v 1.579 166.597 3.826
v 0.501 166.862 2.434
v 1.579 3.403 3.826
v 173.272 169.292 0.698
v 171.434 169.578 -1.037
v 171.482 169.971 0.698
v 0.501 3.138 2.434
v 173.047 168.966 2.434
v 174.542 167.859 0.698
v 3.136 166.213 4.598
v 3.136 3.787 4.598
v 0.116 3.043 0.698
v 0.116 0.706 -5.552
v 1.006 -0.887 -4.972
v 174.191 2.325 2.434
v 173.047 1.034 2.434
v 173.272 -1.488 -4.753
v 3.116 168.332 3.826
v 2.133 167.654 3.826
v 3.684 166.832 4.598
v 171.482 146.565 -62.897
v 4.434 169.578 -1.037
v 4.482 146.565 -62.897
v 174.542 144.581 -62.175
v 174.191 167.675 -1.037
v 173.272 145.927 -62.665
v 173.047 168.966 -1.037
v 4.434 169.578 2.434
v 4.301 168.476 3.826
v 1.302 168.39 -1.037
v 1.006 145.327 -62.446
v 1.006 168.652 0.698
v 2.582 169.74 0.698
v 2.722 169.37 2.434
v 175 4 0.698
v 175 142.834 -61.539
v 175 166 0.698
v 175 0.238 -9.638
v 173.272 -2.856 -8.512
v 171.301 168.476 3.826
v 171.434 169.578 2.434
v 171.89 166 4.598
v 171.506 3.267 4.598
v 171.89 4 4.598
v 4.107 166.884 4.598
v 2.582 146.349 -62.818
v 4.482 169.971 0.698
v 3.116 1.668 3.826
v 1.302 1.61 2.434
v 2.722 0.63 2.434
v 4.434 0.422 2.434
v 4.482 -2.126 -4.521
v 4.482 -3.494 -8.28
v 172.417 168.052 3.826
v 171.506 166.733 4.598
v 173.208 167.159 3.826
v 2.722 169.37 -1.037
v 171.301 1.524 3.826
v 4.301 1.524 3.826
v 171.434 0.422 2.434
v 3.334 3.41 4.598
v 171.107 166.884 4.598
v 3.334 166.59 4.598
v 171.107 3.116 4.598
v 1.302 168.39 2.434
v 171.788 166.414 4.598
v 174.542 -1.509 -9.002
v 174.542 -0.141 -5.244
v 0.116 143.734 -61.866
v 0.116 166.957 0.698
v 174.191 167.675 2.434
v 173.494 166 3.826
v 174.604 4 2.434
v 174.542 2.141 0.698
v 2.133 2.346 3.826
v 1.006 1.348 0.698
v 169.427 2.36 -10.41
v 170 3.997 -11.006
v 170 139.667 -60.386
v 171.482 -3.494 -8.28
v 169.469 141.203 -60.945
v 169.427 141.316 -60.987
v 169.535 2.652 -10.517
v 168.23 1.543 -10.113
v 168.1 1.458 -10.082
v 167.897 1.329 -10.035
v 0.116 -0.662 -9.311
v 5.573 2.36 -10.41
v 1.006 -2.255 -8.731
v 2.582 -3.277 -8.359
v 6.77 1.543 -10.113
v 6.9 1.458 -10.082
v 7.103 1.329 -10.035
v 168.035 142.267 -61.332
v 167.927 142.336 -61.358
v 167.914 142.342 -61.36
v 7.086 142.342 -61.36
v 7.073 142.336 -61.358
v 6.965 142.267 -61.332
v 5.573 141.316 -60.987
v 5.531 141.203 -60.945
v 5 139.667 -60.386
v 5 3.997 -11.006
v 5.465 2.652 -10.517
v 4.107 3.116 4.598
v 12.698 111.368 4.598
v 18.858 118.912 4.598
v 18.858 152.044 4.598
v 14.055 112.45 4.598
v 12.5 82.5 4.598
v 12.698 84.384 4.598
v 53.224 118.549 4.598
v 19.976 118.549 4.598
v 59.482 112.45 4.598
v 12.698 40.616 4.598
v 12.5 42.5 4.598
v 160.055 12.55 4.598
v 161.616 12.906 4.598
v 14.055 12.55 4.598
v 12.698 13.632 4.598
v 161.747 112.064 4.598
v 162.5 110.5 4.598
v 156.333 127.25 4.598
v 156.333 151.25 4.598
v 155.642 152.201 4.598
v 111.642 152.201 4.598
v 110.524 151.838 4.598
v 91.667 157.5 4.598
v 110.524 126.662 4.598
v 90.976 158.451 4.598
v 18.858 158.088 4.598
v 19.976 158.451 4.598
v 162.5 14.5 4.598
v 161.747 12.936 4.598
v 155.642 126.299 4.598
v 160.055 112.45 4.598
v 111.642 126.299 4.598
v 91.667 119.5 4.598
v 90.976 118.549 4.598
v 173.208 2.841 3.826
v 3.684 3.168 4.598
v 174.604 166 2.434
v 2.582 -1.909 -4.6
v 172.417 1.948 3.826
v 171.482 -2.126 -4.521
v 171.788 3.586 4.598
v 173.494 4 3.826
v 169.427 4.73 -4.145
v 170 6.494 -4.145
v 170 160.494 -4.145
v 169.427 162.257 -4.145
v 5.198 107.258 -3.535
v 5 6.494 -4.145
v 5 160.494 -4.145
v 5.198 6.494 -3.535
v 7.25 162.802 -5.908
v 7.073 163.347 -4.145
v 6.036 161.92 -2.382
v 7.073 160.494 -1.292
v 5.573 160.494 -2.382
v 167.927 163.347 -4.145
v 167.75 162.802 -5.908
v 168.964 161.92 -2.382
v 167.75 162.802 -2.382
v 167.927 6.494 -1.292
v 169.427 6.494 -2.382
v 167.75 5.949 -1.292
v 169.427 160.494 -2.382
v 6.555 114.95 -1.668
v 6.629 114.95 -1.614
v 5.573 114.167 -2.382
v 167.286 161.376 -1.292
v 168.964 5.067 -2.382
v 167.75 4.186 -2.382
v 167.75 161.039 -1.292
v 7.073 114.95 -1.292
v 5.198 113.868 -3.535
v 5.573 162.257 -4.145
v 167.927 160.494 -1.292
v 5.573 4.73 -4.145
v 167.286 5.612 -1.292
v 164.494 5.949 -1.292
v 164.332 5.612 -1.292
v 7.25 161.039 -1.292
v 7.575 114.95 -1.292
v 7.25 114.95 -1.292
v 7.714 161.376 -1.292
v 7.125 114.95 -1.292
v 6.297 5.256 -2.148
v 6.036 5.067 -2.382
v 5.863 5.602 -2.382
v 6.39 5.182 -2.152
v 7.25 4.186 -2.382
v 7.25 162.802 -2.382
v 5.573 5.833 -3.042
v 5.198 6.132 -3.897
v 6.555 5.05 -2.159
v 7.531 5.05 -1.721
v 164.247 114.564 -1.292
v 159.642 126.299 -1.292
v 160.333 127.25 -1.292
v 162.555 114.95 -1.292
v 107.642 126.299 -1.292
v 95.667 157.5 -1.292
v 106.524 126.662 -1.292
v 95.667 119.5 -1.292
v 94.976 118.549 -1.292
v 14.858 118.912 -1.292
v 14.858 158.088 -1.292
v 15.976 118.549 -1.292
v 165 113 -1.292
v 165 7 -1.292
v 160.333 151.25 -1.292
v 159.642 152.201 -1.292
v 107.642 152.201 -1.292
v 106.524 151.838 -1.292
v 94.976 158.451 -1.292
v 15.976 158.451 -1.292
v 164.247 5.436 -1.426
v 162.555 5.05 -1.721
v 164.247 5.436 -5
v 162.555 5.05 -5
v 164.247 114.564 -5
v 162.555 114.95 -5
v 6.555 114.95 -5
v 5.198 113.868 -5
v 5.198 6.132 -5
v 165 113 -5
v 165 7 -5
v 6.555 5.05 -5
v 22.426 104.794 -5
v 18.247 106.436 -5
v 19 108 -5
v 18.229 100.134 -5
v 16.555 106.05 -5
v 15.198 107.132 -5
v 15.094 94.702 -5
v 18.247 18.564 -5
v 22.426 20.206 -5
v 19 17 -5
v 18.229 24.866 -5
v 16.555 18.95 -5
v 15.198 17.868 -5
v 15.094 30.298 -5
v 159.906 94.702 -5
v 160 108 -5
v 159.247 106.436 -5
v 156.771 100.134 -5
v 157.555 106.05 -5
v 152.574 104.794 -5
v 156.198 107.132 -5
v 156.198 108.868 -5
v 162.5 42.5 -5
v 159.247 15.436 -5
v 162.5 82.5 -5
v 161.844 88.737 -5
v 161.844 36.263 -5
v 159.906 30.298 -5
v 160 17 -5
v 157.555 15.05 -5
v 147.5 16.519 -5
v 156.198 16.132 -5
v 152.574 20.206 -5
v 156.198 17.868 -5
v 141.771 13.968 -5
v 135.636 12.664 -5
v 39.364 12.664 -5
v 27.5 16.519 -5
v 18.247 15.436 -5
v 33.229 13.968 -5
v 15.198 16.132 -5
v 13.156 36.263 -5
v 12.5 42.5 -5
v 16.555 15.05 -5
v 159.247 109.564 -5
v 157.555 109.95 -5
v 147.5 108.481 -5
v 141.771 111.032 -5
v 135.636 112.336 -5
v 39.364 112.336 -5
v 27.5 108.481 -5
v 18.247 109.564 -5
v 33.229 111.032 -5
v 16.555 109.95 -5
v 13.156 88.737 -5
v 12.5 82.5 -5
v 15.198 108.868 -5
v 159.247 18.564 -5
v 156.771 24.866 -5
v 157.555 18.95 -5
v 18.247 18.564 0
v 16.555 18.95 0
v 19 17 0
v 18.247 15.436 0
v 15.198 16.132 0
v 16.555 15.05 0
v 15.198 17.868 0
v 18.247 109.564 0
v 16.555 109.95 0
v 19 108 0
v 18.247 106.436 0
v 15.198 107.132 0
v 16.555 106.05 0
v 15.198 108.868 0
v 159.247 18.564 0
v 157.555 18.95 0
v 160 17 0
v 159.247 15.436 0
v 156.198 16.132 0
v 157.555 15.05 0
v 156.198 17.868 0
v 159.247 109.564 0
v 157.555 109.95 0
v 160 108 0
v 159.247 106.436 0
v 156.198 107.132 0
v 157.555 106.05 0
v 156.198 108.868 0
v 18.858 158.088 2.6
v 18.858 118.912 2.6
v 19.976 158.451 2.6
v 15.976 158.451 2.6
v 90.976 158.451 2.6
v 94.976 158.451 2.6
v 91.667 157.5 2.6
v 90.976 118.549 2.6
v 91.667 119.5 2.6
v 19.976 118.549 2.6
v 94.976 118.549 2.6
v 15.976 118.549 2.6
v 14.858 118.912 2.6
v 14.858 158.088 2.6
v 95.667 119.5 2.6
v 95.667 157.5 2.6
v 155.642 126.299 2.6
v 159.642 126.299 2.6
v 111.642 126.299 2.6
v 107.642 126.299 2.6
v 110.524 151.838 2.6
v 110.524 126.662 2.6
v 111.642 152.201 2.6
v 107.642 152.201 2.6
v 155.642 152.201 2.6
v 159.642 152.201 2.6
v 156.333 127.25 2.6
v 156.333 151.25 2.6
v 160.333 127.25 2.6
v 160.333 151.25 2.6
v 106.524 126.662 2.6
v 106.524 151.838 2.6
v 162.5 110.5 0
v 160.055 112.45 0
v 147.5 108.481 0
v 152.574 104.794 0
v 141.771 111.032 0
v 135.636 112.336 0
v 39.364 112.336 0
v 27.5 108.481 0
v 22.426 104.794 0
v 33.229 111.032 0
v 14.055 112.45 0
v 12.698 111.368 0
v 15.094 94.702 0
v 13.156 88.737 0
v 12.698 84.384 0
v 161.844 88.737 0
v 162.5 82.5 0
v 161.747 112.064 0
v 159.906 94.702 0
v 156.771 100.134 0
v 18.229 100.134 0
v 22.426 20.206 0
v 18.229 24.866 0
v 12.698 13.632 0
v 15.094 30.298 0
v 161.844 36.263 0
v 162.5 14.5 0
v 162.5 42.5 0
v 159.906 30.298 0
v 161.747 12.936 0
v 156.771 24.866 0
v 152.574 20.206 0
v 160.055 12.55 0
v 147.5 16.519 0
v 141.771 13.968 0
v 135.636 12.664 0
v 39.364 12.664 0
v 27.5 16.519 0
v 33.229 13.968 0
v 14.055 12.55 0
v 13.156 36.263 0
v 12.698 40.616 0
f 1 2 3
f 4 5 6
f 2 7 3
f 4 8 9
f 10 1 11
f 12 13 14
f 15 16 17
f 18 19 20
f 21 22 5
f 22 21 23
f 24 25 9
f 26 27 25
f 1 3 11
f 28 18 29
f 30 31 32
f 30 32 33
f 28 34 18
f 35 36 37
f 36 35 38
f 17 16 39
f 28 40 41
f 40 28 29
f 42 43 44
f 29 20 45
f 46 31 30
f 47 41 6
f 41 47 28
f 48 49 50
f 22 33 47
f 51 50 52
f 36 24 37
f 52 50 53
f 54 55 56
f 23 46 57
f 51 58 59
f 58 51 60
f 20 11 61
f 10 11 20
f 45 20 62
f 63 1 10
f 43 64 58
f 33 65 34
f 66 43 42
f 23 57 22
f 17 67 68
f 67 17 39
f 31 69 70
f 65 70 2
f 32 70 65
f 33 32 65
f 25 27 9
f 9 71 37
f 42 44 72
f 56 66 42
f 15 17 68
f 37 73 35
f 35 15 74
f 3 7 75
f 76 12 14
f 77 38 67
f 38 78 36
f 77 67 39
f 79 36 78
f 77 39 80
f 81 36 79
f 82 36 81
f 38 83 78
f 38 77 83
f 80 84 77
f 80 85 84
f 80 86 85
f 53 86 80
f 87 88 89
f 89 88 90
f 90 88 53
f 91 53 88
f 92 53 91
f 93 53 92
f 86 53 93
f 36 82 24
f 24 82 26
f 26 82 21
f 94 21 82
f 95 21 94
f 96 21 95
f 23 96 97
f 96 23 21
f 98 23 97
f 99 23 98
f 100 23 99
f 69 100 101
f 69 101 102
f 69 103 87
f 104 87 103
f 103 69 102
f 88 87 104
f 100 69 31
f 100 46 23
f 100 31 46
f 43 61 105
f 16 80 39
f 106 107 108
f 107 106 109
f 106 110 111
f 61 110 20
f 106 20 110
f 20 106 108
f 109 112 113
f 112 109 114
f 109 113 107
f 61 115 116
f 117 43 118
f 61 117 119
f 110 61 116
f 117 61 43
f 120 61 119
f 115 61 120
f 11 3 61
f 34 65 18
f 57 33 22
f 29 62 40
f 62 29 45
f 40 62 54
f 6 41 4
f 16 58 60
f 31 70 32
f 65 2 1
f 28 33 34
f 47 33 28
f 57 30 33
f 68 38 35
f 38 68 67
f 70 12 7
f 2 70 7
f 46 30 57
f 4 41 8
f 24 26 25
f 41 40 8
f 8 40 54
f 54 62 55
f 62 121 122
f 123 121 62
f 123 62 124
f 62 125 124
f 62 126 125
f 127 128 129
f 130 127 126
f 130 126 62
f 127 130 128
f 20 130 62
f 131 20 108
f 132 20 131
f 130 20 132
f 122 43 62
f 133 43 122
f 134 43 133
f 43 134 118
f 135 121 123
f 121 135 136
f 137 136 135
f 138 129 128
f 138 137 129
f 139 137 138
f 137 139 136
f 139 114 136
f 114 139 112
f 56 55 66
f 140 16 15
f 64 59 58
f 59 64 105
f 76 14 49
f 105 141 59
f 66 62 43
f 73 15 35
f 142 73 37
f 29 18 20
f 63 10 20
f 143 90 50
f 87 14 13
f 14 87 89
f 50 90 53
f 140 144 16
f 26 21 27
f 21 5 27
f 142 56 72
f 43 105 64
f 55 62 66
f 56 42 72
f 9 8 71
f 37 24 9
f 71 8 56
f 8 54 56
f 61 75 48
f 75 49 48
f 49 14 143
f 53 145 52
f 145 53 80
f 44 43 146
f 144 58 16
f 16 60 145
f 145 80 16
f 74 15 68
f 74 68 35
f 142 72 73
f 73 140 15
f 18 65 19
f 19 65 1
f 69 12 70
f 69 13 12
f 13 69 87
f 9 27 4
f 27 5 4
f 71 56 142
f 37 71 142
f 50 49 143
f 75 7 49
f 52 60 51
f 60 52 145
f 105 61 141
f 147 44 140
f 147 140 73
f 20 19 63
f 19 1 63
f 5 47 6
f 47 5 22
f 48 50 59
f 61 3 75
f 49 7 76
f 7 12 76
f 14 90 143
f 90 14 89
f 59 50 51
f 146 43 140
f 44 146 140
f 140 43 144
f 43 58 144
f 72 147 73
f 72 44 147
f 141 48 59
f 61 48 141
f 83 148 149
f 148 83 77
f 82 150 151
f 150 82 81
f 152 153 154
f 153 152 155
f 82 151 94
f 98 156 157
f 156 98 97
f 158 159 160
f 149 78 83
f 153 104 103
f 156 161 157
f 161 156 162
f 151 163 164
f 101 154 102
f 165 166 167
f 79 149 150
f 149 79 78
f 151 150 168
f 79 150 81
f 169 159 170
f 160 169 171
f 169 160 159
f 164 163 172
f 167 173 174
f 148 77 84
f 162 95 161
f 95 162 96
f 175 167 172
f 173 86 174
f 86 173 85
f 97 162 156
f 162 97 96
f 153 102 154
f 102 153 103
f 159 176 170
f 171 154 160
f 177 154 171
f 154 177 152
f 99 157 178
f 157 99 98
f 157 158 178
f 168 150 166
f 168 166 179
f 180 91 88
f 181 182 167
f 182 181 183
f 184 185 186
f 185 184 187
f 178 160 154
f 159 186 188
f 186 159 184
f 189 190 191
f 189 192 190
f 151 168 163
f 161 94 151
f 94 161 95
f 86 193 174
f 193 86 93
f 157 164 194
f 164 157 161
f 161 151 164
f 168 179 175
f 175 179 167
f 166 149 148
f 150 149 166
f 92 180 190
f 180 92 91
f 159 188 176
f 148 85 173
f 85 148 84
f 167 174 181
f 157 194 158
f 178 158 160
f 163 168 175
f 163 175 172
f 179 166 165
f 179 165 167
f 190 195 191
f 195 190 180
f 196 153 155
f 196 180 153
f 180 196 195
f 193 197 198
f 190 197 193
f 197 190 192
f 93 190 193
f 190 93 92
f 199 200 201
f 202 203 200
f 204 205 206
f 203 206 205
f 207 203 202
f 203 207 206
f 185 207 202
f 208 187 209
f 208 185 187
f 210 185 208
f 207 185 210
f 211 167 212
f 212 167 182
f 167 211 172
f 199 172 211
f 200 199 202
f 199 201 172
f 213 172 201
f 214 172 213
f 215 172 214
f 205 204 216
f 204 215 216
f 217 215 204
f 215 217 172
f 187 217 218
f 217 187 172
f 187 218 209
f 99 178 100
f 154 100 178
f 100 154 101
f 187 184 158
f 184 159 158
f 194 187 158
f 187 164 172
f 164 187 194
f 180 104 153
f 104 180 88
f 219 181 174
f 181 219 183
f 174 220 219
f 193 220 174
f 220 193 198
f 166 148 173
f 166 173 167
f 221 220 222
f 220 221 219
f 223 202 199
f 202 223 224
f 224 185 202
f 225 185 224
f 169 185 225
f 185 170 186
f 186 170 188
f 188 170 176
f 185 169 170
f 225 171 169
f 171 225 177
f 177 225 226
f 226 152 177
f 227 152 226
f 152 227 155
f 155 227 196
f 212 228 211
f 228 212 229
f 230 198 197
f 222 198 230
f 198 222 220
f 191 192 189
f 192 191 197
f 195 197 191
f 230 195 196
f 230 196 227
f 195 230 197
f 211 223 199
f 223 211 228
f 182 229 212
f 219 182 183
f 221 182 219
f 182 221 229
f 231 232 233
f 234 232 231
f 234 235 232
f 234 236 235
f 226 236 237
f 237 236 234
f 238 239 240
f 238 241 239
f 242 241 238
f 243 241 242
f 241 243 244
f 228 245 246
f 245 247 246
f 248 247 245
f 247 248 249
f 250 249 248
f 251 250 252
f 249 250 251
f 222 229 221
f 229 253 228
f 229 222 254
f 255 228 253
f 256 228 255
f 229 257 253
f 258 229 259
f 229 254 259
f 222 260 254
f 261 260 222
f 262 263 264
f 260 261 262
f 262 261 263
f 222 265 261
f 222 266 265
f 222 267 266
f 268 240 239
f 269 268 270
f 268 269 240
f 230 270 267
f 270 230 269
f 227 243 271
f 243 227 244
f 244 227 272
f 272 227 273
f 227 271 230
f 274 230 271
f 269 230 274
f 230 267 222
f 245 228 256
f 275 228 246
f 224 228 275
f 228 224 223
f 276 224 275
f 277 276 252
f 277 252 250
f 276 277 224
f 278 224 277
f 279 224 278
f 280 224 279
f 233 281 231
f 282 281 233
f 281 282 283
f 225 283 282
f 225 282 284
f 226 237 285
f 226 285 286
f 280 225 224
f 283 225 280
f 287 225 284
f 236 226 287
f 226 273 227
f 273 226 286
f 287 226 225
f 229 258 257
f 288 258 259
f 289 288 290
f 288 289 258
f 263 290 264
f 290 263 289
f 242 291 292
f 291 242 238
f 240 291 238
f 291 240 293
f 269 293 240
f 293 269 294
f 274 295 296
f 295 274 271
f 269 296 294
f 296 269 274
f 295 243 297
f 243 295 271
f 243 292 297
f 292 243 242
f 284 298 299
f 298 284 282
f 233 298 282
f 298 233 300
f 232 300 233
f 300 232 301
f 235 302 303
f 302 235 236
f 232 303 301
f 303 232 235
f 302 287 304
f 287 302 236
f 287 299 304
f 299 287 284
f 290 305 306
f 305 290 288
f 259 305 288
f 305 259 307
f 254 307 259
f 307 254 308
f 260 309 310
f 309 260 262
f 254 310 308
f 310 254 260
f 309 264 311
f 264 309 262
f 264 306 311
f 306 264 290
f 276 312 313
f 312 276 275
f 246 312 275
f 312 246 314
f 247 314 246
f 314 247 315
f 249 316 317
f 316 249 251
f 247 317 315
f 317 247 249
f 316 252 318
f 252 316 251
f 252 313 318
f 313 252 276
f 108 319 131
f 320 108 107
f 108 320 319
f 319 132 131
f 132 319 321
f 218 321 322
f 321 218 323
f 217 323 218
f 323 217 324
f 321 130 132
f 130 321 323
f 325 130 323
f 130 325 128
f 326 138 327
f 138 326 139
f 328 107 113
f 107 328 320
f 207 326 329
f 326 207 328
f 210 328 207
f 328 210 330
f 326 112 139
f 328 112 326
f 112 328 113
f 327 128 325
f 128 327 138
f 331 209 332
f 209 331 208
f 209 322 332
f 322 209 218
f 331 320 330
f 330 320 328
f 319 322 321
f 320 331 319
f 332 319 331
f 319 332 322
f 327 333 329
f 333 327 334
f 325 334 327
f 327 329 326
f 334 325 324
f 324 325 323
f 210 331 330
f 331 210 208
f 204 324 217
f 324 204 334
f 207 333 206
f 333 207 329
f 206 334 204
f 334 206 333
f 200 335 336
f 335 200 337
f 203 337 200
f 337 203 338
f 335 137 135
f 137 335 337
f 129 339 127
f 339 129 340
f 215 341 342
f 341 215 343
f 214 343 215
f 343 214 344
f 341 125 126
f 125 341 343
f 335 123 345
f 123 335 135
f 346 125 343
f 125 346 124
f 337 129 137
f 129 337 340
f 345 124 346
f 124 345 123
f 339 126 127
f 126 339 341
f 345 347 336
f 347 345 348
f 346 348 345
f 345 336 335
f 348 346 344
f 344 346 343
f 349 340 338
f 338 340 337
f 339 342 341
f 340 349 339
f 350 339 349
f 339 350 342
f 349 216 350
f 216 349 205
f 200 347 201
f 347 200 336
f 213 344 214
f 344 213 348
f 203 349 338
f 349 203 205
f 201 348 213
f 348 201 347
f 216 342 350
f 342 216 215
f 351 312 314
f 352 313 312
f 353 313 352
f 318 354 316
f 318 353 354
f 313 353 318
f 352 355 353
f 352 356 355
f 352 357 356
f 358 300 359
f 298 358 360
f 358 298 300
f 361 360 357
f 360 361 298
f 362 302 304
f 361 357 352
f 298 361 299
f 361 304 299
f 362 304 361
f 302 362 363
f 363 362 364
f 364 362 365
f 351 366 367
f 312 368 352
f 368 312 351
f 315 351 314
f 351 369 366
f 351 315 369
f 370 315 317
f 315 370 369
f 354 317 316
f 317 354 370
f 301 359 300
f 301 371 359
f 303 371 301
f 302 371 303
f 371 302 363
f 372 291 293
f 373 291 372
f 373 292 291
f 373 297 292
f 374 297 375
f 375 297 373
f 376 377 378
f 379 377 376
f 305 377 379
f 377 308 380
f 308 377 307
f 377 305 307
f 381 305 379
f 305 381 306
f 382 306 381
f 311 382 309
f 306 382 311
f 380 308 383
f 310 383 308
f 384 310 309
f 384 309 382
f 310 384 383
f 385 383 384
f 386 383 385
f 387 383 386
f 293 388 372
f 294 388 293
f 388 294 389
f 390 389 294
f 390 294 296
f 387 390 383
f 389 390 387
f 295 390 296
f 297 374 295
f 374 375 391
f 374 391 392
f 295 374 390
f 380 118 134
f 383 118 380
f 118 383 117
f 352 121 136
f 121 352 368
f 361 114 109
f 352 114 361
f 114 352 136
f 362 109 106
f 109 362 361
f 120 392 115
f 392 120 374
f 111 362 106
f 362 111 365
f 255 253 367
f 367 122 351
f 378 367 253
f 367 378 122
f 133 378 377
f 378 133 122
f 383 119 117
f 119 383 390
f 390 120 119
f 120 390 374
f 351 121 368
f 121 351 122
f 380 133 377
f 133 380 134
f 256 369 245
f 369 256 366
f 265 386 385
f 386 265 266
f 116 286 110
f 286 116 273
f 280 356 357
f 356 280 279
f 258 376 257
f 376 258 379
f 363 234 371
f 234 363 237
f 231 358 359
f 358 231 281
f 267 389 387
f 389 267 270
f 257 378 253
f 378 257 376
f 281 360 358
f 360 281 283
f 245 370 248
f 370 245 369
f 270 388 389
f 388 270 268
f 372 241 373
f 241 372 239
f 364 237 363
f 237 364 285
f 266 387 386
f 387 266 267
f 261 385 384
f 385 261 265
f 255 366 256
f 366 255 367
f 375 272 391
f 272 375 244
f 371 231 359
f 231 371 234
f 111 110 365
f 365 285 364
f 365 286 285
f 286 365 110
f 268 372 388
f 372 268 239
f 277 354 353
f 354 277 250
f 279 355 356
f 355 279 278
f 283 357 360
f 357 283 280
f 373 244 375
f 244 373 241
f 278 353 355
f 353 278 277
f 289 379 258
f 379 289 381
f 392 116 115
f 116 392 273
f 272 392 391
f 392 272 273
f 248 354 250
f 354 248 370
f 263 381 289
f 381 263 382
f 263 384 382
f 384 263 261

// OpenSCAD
DSPscreensz=[150,100,4];
DSPscreenr=2;

currentscreen=[73,40,3];
tempscreen=[46,26,3];

DSPbacksz=[80,70,25];
DSPbezelT=4;
angle=20;
cornerradius=4;
innerradius=3;
wallt=5;
topt=5;
facesz=[DSPscreensz[0]+wallt*2+5*3,170];

h=15;//height at theoretical front corner. (doesn't exist because of radius)

module roundedbox(sz, radius)
{
    hull(){
        for(x=[radius/2,sz[0]-radius/2])
        for(y=[radius/2,sz[1]-radius/2])
        for(z=[radius/2,sz[2]-radius/2])
        translate([x,y,z])
        sphere(r=radius);
    }    
    
    
}
//h=100;
//rotate([angle,0,0]) roundedbox([DSPscreensz[0]+DSPbezelT*2,DSPscreensz[1]+DSPbezelT*2,h], radius=cornerradius.);

module splate(xsz,ysz, cornerradius){
    hull(){
        for(x=[cornerradius,xsz-cornerradius])
        for(y=[cornerradius,ysz-cornerradius])
        translate([x,y,cornerradius])
        sphere(r=cornerradius);
    }
}
module cplate(xsz,ysz,t, cornerradius){
    hull(){
        for(x=[cornerradius,xsz-cornerradius])
        for(y=[cornerradius,ysz-cornerradius])
        translate([x,y,0])
        cylinder(r=cornerradius, h=t);
    }
}




module pillar(facesz, h, cornerradius, angle){
//height at theoretical front corner. (doesn't exist because of radius)
        hull(){
            
        translate([0,cornerradius,h-cornerradius])
        rotate([angle,0,0])
        translate([0,-cornerradius,-cornerradius])
        splate(facesz[0], facesz[1], cornerradius);
        
        cplate(facesz[0], facesz[1]*cos(angle),cornerradius,cornerradius);
        }
    }        

module bezel(){
    difference(){

        union(){
        translate([0,cornerradius,topt*cos(angle)-cornerradius])
        rotate([-angle,0,0])
        translate([0,-cornerradius,-h+cornerradius])
        difference()  {
        pillar(facesz, h, cornerradius, angle);

        translate([wallt,wallt,-topt*cos(angle)])
        pillar([for(v=facesz)v-2*wallt], h, innerradius, angle);
        }
        
        translate([5,5,-topt])
        cplate(DSPscreensz[0]+10,DSPscreensz[1]+10,topt+1,DSPscreenr);
        }
        
        offset1=(facesz[0]-DSPscreensz[0])/2;
        translate([offset1,offset1,0])
        cplate(DSPscreensz[0],DSPscreensz[1],topt*2,DSPscreenr);

        translate([offset1,offset1,-topt])
        cplate(DSPscreensz[0],DSPscreensz[1],topt*2,30);

        translate([facesz[0]/2,offset1+DSPscreensz[1]/2,0])
        for(i = [-1,1])
        for(j = [-1,1])
        translate([i*141/2,j*91/2,-50])
        cylinder(r=2, h=100);
        
        offset2=(facesz[0]-currentscreen[0]-tempscreen[0])/3;
        //offset2=cornerradius+2+4;
        translate([offset2,offset1+DSPscreensz[1]+6,-topt]){
            cplate(currentscreen[0],currentscreen[1],topt*2,1);
            translate([-4,0,-2.4])
            cplate(currentscreen[0]+8,currentscreen[1],topt*2,1);
        }
        translate([offset2+currentscreen[0]+offset2,(offset1+DSPscreensz[1])+(facesz[1]-cornerradius-(offset1+DSPscreensz[1]))/2-tempscreen[1]/2,-topt]){
            cplate(tempscreen[0],tempscreen[1],topt*2,1);
            translate([-4,0,-2.4])
            cplate(tempscreen[0]+8,tempscreen[1],topt*2,1);
        }
        

    }
}

module base(){

union(){
cplate(facesz[0], (facesz[1])*cos(angle),4,cornerradius);
translate([wallt,wallt,3])
cplate(facesz[0]-2*wallt, (facesz[1]-2*wallt)*cos(angle),4,cornerradius);
}
}
bezel();
//base();
